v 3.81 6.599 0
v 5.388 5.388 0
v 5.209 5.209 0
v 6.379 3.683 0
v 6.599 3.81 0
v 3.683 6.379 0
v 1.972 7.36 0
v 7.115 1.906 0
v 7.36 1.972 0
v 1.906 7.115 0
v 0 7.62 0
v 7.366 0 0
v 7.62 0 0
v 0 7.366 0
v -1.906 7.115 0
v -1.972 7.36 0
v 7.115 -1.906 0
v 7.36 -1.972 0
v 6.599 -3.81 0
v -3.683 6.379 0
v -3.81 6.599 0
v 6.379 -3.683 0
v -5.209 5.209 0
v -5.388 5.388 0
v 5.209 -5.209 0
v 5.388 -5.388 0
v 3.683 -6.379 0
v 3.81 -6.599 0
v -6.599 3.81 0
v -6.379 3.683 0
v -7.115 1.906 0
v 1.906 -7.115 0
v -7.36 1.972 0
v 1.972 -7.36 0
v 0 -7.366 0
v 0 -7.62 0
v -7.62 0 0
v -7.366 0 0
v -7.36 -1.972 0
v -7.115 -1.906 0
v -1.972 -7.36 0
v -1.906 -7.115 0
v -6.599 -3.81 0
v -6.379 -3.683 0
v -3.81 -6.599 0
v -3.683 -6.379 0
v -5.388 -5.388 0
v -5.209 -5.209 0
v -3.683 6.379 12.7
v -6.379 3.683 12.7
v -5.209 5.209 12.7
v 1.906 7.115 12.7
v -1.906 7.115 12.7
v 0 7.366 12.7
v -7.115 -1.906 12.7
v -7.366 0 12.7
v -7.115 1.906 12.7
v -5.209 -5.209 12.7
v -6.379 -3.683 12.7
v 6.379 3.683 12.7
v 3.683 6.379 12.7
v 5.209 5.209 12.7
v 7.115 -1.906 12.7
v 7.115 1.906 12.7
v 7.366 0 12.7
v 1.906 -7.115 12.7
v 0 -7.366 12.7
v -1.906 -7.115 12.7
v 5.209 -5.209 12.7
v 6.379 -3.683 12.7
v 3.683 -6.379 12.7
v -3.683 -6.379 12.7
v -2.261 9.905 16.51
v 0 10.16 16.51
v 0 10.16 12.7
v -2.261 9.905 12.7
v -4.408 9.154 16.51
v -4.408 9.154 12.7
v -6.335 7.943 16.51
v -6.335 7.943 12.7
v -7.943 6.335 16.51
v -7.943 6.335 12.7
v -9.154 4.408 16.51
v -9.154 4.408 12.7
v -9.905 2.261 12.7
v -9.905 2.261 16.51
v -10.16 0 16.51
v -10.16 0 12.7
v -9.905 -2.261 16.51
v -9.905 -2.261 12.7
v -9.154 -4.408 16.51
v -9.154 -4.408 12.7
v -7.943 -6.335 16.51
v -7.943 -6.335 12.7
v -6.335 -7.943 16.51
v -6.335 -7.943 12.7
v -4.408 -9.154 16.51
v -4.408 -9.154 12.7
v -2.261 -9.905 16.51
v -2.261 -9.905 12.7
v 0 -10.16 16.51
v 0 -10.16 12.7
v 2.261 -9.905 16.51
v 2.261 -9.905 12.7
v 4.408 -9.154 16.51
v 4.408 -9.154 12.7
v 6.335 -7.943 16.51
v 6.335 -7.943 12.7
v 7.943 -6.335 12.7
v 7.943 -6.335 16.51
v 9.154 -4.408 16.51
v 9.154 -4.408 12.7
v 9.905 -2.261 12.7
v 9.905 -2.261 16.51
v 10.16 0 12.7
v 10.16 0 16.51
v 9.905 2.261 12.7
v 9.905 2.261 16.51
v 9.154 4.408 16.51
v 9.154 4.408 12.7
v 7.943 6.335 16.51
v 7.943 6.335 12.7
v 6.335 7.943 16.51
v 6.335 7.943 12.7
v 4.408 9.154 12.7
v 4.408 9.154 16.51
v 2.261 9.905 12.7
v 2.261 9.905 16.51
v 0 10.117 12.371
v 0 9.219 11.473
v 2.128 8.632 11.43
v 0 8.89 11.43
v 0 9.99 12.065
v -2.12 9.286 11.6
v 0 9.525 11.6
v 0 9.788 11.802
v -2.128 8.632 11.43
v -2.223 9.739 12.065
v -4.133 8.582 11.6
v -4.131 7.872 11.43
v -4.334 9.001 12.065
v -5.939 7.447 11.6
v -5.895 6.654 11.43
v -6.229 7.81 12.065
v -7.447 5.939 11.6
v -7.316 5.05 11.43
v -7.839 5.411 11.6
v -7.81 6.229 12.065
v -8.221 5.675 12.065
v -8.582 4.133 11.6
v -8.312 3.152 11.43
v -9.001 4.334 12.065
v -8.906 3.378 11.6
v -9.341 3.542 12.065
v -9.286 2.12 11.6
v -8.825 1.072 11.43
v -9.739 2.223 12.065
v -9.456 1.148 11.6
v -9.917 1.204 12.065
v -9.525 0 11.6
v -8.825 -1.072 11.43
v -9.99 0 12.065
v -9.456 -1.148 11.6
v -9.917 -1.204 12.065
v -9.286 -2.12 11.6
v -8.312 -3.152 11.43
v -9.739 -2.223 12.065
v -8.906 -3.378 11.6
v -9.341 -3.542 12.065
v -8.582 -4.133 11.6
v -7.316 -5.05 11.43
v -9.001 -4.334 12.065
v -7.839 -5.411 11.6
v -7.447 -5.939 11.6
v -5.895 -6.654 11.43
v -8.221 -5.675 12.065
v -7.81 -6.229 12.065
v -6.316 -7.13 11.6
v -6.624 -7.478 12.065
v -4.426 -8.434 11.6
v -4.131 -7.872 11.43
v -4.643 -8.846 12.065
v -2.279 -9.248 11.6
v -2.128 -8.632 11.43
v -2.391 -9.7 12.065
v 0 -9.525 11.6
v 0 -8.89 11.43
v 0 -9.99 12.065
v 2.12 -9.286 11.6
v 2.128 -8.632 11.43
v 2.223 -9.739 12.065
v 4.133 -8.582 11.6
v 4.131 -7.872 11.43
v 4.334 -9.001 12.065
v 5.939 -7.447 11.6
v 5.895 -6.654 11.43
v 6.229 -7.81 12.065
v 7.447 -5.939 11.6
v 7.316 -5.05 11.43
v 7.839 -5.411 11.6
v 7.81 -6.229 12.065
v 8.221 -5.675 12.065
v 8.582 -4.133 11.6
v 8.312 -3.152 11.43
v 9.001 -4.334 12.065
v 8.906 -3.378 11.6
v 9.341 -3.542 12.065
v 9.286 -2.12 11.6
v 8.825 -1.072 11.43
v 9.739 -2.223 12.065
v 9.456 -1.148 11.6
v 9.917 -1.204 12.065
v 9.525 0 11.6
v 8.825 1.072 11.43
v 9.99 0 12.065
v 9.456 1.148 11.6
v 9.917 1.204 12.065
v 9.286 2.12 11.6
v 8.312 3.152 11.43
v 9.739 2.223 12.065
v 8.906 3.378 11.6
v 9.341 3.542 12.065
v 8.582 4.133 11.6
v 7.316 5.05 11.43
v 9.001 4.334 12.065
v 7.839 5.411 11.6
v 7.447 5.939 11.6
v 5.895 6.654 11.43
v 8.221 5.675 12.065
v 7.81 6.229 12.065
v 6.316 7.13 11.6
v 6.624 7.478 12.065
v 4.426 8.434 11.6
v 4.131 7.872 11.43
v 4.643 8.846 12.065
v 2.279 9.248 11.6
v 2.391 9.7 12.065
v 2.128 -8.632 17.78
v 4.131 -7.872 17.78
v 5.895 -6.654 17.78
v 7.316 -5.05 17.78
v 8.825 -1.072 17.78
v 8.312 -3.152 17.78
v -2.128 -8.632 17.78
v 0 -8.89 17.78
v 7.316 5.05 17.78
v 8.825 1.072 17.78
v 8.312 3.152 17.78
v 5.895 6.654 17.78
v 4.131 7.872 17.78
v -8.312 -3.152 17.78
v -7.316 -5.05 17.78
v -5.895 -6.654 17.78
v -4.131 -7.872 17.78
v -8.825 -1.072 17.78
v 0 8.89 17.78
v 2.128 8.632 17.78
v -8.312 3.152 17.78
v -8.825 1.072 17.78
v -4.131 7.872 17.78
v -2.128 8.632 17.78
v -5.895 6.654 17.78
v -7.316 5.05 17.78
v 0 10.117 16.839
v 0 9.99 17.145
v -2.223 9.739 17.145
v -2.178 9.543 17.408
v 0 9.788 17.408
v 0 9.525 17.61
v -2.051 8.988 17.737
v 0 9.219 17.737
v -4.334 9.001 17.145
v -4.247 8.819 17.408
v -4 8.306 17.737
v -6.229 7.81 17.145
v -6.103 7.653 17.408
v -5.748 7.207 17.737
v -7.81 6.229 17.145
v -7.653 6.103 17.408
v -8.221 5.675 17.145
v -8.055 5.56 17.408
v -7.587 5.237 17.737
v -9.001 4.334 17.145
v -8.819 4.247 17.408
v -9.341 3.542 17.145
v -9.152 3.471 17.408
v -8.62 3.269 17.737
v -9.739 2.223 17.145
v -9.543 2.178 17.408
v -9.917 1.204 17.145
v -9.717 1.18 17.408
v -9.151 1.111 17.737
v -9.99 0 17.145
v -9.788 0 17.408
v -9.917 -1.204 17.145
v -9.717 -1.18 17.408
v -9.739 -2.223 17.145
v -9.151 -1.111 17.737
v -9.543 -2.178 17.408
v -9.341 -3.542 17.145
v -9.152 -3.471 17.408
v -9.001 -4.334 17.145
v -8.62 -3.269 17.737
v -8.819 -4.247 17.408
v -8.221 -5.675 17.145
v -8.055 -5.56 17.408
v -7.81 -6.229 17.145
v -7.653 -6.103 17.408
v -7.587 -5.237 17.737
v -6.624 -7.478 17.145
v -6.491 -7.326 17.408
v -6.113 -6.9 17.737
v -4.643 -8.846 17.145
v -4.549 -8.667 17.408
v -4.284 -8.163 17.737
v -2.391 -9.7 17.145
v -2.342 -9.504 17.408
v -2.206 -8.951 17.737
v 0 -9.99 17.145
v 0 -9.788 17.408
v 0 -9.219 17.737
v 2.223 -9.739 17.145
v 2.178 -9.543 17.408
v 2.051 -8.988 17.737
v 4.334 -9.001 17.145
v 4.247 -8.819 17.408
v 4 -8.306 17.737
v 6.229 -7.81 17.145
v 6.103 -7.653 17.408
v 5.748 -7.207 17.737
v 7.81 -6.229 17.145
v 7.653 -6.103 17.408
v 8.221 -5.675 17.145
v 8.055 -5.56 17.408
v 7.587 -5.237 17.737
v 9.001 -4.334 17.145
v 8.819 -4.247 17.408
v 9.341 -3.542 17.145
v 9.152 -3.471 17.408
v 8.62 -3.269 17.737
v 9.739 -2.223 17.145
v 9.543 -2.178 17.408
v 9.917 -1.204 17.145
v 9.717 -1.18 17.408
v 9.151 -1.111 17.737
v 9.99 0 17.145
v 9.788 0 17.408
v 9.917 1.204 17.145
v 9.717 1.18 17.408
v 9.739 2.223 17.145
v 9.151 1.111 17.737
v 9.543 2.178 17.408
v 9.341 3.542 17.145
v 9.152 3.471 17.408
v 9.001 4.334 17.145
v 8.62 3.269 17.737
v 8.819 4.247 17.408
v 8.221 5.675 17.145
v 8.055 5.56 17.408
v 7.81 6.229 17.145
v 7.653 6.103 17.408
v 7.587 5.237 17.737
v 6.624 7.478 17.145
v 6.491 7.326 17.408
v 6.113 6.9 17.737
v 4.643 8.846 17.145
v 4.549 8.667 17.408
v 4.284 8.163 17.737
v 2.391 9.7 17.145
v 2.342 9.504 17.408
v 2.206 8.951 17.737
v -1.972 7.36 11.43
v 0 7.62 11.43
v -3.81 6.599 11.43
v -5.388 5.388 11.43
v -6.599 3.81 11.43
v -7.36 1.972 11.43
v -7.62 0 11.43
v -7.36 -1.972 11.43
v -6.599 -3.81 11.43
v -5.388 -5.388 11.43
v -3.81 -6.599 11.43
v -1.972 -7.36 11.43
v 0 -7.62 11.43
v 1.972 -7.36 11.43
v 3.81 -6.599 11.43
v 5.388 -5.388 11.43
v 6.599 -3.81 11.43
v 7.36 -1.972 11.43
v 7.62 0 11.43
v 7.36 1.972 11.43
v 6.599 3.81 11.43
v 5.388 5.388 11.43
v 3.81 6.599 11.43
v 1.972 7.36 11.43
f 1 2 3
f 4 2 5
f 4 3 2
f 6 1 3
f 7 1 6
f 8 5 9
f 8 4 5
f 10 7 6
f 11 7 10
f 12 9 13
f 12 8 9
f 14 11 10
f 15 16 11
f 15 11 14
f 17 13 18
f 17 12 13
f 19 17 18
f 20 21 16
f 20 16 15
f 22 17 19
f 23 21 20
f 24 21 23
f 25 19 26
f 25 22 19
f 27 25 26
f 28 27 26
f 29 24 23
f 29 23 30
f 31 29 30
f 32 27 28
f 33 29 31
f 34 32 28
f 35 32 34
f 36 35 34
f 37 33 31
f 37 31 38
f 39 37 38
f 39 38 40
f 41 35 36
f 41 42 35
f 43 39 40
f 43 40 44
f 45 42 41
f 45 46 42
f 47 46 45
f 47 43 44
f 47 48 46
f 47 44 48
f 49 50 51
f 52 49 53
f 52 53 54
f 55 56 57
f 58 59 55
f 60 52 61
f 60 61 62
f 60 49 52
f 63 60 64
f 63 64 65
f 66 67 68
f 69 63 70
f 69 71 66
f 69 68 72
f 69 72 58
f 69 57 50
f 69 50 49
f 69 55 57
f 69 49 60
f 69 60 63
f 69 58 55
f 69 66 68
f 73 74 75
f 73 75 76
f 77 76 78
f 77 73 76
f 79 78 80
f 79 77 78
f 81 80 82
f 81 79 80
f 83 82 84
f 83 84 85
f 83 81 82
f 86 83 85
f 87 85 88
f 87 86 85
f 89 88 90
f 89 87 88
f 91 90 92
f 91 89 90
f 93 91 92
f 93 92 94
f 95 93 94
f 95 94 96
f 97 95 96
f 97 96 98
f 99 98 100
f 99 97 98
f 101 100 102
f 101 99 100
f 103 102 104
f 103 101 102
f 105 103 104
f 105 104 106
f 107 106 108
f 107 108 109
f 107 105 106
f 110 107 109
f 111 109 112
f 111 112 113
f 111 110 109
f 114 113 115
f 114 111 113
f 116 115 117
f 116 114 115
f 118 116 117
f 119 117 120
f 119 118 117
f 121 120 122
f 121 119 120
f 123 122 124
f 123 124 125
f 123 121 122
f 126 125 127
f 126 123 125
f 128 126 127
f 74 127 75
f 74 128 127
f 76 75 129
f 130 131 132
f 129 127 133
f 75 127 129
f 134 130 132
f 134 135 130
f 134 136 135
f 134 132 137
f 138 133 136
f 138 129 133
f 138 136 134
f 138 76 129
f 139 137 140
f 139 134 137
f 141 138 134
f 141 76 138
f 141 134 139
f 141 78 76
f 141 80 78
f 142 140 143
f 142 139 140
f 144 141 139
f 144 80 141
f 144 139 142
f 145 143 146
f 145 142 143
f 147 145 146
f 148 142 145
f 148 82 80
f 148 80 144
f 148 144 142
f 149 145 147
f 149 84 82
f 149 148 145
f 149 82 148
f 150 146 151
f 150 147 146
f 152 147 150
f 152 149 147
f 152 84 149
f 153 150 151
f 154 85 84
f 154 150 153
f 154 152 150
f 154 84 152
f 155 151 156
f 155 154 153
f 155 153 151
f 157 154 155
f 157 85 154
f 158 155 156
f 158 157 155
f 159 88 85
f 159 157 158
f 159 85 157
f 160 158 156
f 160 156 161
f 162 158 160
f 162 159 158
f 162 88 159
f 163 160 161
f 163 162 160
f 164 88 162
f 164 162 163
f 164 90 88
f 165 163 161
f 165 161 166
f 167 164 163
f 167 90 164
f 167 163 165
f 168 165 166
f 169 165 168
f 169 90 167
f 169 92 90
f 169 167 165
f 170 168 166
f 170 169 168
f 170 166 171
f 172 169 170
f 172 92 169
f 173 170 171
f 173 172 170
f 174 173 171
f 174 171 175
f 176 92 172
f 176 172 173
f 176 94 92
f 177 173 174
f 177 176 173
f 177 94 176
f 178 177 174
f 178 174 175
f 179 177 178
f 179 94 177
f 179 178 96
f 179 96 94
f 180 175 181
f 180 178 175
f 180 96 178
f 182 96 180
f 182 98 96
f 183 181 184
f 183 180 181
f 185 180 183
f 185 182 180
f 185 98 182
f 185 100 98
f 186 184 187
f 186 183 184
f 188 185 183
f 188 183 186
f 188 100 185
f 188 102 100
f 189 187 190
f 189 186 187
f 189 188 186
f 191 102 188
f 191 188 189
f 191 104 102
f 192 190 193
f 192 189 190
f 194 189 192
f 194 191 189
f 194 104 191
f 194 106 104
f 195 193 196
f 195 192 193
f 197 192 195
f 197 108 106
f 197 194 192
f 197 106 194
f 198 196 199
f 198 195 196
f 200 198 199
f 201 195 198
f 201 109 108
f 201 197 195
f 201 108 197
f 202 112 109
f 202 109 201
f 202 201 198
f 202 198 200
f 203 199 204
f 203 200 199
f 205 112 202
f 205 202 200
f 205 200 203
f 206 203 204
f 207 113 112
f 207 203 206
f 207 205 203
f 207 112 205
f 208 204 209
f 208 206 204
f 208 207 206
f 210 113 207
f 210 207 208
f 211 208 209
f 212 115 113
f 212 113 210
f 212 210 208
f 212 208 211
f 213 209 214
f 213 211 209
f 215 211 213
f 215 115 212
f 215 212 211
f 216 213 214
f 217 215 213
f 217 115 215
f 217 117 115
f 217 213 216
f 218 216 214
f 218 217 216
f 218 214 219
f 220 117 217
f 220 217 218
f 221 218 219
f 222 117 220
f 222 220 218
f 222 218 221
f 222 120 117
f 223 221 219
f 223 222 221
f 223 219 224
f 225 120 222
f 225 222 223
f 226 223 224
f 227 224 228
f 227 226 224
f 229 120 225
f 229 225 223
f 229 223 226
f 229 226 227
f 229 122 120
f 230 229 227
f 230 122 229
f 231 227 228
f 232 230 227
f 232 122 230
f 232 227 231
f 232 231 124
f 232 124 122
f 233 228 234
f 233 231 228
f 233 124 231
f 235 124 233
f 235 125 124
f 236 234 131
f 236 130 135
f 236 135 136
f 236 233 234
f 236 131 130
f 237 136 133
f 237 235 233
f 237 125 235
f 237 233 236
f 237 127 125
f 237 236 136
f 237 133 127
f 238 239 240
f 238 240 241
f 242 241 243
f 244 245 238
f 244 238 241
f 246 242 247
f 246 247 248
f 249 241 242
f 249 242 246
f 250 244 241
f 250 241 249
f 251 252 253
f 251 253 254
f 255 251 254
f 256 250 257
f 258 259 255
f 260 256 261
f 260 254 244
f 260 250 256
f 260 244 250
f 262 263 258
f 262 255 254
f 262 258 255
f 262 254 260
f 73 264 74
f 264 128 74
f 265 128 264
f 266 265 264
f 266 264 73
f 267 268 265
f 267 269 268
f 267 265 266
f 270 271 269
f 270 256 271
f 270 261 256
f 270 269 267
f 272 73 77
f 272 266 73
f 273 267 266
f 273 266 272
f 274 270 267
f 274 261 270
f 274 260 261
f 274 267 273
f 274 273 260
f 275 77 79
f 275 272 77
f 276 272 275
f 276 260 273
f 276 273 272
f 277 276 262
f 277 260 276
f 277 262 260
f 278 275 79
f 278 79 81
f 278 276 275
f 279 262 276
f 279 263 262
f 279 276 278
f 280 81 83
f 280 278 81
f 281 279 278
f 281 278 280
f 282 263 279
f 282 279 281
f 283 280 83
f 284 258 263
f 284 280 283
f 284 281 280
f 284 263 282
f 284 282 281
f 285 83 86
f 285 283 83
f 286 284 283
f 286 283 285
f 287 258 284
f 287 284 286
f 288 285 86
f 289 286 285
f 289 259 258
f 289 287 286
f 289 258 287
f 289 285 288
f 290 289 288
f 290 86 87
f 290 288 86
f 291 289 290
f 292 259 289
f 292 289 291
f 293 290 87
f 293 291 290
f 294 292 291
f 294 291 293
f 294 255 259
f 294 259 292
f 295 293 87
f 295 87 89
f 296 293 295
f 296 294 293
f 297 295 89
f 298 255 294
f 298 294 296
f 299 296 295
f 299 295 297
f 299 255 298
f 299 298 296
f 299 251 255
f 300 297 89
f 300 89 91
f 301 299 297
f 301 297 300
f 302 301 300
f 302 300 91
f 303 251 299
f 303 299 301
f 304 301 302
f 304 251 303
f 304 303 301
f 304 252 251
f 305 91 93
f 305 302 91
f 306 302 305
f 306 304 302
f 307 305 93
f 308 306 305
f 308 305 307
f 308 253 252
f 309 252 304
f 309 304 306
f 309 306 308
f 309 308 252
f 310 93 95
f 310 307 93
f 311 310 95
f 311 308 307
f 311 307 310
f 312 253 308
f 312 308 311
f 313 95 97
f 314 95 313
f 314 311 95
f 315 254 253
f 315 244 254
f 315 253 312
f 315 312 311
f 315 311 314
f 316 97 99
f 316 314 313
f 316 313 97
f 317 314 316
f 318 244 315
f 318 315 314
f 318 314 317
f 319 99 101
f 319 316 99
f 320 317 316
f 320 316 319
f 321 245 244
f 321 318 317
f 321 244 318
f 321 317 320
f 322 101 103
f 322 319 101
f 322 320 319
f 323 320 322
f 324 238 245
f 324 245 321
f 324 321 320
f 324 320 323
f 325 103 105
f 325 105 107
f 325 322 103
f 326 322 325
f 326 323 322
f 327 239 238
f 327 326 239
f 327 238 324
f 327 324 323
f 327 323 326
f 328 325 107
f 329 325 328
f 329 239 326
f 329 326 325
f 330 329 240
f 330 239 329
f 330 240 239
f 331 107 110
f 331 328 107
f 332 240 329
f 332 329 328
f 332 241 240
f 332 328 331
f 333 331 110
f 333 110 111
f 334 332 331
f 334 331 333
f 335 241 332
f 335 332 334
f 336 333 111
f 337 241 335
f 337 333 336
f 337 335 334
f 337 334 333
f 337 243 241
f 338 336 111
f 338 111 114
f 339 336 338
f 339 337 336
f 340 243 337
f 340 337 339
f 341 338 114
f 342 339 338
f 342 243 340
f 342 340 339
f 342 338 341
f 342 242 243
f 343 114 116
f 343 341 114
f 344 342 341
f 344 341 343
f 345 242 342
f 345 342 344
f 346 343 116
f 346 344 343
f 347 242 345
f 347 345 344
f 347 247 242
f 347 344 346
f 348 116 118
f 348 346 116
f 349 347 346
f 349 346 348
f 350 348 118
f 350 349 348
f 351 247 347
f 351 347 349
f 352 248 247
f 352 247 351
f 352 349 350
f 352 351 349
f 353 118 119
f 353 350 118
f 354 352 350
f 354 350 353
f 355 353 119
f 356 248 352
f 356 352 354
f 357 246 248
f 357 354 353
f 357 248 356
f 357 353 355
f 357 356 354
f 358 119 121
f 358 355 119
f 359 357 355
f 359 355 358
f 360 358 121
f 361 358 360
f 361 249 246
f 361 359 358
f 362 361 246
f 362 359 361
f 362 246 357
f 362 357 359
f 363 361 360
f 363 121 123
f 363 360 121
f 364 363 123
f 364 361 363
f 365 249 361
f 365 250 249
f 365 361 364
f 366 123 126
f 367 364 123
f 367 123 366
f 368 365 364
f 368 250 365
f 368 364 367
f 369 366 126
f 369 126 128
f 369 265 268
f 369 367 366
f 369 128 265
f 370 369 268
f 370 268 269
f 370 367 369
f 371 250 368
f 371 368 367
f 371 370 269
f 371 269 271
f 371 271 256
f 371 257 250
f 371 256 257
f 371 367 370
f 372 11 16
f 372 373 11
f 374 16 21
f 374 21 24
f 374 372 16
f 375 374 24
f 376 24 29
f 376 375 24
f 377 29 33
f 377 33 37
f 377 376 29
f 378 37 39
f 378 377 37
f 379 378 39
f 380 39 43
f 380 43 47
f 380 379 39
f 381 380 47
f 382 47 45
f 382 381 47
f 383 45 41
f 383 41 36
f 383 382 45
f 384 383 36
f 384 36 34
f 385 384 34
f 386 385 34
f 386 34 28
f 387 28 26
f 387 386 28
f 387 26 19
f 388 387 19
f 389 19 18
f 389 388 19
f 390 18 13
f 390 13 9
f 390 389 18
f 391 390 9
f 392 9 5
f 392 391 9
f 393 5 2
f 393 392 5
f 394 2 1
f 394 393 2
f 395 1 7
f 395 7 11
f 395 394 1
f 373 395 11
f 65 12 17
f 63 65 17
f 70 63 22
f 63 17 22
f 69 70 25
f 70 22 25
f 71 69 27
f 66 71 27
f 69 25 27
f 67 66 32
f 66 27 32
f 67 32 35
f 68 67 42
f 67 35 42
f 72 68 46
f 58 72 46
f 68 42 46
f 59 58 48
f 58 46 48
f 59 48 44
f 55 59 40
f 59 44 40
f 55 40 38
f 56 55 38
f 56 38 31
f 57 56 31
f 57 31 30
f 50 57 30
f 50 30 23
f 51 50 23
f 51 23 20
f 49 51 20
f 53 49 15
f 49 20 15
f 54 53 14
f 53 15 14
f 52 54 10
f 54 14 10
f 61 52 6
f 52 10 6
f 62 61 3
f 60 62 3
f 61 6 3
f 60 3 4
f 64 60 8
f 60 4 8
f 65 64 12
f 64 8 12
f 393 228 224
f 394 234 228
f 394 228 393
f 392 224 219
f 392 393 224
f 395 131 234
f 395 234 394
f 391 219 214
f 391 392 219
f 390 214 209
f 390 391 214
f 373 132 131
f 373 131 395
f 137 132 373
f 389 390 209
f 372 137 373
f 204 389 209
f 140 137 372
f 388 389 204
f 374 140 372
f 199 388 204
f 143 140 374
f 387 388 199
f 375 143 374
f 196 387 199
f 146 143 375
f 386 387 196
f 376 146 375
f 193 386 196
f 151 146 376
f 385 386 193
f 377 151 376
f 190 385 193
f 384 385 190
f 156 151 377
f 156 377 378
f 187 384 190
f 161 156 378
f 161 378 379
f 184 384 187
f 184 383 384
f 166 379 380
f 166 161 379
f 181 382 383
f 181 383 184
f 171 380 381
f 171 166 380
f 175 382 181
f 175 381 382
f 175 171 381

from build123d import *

# Parameters (mm, degrees)
F0_W     = 7.62
F0_H     = 11.43
F2_R     = 1.27
F3_R     = 7.366
F4_DEPTH = 12.7


with BuildPart() as f1:
    # F0 (on Right) → F1 (revolve)
    with BuildSketch(Plane.YZ):
        with Locations((3.81, 5.715)):
            Rectangle(F0_W, F0_H)
        Polygon((0, 17.78), (0, 11.43), (7.62, 11.43), (10.16, 11.43), (10.16, 17.78), align=None)
    revolve(axis=Axis((0, 0, 5.715), (0, 0, 1)))

    # F2
    f2_edges = [f1.edges().sort_by_distance(p)[0] for p in [
        (0, -10.16, 11.43),
        (0, -10.16, 17.78),
        (0, 10.16, 14.605),
    ]]
    fillet(f2_edges, radius=F2_R)

    # F3 (on face) → F4 (cut)
    with BuildSketch(Plane(origin=(0, 0, 0), x_dir=(1, 0, 0), z_dir=(0, 0, -1))):
        Circle(F3_R)
    extrude(amount=-F4_DEPTH, mode=Mode.SUBTRACT)


solid = f1.part
